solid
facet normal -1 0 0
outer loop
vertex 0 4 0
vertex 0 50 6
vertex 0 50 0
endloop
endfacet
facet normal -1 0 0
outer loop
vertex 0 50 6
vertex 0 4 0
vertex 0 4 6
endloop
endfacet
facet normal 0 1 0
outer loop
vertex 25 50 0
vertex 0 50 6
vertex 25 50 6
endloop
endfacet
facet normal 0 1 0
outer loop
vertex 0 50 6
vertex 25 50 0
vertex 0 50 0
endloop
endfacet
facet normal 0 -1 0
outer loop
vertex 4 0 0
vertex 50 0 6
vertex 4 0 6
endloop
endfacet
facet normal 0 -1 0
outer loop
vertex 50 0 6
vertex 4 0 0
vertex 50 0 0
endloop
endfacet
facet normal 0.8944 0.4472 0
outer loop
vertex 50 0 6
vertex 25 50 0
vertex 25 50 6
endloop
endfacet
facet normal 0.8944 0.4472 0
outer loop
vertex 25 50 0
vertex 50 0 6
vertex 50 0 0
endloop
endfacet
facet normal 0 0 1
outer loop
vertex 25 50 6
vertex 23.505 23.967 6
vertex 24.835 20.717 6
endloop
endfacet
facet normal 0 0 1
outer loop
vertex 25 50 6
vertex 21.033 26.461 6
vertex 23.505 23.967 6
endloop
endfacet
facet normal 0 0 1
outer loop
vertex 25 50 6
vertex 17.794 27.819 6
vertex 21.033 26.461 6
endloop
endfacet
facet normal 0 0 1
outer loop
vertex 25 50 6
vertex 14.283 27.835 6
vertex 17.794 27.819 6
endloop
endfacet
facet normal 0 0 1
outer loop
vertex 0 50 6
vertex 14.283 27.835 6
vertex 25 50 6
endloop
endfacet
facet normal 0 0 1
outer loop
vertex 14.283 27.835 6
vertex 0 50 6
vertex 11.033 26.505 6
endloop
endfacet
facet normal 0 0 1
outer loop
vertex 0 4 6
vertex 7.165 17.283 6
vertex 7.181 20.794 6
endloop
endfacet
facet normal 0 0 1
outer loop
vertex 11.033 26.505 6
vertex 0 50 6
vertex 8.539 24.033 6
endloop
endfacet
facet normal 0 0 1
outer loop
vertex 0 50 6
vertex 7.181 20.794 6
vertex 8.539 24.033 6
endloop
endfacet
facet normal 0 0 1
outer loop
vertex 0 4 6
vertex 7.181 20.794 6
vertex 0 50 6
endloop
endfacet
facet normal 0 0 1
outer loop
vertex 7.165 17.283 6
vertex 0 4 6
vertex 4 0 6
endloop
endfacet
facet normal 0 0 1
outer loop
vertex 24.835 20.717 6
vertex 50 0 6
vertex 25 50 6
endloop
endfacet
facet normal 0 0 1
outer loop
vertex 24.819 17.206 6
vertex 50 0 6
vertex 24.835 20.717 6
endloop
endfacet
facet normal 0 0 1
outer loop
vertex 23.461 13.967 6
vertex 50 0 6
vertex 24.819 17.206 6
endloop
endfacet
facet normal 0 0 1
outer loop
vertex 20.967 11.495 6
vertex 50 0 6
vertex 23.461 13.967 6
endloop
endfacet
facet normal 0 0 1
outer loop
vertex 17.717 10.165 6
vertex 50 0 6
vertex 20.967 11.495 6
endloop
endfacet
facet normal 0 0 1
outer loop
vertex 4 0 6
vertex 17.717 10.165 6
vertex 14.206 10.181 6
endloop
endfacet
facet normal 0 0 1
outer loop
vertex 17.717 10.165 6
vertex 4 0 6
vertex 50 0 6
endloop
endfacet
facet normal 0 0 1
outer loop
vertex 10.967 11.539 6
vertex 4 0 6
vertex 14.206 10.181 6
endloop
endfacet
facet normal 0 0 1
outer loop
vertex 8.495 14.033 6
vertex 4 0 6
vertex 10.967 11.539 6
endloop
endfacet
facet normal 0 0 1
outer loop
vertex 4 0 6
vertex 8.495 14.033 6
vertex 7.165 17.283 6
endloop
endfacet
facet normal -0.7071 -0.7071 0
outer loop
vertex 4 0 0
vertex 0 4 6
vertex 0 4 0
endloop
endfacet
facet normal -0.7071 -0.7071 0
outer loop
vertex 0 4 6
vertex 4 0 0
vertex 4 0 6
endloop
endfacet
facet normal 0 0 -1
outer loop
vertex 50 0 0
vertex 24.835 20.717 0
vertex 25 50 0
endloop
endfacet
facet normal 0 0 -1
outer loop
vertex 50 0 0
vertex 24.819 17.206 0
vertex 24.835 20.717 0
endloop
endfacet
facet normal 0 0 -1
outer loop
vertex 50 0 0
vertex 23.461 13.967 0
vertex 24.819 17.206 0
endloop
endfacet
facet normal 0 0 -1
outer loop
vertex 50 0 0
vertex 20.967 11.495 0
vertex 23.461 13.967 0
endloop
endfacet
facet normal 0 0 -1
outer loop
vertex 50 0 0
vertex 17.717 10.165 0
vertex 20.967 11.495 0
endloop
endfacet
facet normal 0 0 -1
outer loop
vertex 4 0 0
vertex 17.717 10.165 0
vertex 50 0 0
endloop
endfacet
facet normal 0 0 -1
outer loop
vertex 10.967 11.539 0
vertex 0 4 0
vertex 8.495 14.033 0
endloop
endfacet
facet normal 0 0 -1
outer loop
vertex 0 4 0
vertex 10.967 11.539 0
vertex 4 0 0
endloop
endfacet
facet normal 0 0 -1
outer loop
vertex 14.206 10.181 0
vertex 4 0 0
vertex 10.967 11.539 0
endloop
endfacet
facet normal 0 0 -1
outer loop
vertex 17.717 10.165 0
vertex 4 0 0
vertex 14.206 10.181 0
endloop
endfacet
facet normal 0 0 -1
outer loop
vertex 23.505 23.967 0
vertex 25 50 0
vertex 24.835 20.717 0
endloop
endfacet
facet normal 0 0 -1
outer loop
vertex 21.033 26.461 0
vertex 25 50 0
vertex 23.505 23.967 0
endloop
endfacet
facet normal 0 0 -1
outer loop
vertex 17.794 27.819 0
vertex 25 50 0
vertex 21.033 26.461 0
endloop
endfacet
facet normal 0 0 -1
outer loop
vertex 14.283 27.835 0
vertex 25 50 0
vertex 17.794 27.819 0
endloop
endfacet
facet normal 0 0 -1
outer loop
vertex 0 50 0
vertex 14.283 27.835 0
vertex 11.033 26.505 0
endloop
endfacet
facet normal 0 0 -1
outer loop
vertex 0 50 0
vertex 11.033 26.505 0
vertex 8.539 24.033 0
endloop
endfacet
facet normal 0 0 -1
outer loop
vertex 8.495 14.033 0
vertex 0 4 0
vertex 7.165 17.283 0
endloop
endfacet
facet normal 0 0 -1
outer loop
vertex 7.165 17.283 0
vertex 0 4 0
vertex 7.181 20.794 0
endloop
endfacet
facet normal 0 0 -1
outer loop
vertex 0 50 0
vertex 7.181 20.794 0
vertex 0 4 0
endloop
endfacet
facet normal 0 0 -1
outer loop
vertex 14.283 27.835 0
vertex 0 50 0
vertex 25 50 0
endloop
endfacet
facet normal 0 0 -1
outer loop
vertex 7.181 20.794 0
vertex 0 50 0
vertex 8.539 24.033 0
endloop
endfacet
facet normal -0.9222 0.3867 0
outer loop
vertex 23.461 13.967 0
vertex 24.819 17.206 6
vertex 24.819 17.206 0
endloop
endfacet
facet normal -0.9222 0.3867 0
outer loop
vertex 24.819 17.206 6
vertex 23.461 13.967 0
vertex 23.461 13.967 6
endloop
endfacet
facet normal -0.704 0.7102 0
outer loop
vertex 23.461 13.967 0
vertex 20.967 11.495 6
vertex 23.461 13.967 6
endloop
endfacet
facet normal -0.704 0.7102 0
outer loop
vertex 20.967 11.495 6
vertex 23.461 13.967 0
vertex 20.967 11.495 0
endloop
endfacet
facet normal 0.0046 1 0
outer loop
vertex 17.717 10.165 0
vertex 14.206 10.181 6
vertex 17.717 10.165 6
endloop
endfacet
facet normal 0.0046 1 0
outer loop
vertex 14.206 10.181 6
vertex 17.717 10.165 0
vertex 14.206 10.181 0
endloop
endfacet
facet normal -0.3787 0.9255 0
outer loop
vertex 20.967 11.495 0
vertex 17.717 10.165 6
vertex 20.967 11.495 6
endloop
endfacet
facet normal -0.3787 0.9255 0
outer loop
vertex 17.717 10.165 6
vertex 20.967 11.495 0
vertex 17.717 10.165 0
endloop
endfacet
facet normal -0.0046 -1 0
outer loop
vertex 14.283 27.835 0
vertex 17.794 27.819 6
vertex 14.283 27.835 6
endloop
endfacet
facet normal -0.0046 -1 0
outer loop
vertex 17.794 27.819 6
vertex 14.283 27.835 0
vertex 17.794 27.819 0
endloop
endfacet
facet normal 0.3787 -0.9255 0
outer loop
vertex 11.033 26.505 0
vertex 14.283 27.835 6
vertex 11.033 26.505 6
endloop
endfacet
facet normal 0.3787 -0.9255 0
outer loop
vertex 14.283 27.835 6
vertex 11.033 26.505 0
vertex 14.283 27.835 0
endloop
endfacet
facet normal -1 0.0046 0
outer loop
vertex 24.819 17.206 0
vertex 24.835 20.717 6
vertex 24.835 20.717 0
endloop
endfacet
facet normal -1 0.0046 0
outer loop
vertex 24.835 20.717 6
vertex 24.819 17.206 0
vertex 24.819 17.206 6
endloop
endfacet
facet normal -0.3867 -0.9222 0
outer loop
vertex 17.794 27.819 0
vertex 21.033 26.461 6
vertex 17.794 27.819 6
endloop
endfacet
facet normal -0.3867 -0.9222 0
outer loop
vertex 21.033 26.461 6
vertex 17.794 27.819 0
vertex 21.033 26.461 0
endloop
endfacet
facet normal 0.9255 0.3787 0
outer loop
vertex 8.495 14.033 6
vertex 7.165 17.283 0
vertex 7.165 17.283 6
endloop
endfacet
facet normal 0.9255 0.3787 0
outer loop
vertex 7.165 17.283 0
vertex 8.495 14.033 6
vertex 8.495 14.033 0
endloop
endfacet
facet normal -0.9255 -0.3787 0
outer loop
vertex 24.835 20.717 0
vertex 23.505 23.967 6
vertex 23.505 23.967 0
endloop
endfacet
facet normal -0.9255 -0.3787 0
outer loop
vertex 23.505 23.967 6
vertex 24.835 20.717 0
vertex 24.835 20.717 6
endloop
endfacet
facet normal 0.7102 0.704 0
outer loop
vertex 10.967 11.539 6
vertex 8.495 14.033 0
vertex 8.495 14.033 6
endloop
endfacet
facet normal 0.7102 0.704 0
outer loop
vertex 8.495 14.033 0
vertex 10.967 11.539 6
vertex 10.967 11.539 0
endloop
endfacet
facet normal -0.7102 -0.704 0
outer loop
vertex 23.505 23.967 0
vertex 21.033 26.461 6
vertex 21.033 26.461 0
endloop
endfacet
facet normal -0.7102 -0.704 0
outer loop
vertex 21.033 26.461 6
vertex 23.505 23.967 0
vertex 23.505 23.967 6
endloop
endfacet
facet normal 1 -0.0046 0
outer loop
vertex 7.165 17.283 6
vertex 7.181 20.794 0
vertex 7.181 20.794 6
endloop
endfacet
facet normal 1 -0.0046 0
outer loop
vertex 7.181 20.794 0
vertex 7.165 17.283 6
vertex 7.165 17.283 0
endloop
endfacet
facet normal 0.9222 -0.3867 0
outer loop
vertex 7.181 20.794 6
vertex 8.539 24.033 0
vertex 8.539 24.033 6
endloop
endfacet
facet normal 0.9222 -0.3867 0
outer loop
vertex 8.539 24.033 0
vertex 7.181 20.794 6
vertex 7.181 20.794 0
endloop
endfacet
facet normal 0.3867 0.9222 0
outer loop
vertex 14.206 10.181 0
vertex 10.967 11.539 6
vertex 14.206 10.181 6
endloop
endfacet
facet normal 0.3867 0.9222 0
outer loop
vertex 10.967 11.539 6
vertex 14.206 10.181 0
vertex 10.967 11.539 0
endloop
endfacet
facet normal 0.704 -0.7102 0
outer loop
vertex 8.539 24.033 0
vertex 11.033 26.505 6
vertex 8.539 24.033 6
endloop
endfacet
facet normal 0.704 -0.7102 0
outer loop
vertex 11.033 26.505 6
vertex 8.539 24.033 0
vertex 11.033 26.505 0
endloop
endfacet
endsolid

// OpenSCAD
$fn = 32;

// ----------------------------------------------------------------------
// Bracket plate: gusset 50 x 50
// ----------------------------------------------------------------------

// --- parameters (mm) ---
hole_r = 3;               // bolt hole radius
plate_t = 6;              // plate thickness, Z (extrusion height)
gus_a = 50;               // base length
gus_b = 50;               // height
top_x = 25;               // top edge X of the angled cut
light_r = 9;              // lightening hole radius

light_d = 2 * light_r;

profile = [[4, 0], [25, 0], [50, 0], [25, 50], [0, 50], [0, 4]];  // primary outline, 6 points, counter clockwise
void_1 = [[24.835, 20.717], [23.505, 23.967], [21.033, 26.461], [17.794, 27.819], [14.283, 27.835], [11.033, 26.505], [8.539, 24.033], [7.181, 20.794], [7.165, 17.283], [8.495, 14.033], [10.967, 11.539], [14.206, 10.181], [17.717, 10.165], [20.967, 11.495], [23.461, 13.967], [24.819, 17.206]];  // lightening hole, 16 points

// --- the one profile operation ---
difference() {
  linear_extrude(height = plate_t) polygon(points = profile);
  translate([0, 0, -1])
    linear_extrude(height = plate_t + 2) polygon(points = void_1);
}
